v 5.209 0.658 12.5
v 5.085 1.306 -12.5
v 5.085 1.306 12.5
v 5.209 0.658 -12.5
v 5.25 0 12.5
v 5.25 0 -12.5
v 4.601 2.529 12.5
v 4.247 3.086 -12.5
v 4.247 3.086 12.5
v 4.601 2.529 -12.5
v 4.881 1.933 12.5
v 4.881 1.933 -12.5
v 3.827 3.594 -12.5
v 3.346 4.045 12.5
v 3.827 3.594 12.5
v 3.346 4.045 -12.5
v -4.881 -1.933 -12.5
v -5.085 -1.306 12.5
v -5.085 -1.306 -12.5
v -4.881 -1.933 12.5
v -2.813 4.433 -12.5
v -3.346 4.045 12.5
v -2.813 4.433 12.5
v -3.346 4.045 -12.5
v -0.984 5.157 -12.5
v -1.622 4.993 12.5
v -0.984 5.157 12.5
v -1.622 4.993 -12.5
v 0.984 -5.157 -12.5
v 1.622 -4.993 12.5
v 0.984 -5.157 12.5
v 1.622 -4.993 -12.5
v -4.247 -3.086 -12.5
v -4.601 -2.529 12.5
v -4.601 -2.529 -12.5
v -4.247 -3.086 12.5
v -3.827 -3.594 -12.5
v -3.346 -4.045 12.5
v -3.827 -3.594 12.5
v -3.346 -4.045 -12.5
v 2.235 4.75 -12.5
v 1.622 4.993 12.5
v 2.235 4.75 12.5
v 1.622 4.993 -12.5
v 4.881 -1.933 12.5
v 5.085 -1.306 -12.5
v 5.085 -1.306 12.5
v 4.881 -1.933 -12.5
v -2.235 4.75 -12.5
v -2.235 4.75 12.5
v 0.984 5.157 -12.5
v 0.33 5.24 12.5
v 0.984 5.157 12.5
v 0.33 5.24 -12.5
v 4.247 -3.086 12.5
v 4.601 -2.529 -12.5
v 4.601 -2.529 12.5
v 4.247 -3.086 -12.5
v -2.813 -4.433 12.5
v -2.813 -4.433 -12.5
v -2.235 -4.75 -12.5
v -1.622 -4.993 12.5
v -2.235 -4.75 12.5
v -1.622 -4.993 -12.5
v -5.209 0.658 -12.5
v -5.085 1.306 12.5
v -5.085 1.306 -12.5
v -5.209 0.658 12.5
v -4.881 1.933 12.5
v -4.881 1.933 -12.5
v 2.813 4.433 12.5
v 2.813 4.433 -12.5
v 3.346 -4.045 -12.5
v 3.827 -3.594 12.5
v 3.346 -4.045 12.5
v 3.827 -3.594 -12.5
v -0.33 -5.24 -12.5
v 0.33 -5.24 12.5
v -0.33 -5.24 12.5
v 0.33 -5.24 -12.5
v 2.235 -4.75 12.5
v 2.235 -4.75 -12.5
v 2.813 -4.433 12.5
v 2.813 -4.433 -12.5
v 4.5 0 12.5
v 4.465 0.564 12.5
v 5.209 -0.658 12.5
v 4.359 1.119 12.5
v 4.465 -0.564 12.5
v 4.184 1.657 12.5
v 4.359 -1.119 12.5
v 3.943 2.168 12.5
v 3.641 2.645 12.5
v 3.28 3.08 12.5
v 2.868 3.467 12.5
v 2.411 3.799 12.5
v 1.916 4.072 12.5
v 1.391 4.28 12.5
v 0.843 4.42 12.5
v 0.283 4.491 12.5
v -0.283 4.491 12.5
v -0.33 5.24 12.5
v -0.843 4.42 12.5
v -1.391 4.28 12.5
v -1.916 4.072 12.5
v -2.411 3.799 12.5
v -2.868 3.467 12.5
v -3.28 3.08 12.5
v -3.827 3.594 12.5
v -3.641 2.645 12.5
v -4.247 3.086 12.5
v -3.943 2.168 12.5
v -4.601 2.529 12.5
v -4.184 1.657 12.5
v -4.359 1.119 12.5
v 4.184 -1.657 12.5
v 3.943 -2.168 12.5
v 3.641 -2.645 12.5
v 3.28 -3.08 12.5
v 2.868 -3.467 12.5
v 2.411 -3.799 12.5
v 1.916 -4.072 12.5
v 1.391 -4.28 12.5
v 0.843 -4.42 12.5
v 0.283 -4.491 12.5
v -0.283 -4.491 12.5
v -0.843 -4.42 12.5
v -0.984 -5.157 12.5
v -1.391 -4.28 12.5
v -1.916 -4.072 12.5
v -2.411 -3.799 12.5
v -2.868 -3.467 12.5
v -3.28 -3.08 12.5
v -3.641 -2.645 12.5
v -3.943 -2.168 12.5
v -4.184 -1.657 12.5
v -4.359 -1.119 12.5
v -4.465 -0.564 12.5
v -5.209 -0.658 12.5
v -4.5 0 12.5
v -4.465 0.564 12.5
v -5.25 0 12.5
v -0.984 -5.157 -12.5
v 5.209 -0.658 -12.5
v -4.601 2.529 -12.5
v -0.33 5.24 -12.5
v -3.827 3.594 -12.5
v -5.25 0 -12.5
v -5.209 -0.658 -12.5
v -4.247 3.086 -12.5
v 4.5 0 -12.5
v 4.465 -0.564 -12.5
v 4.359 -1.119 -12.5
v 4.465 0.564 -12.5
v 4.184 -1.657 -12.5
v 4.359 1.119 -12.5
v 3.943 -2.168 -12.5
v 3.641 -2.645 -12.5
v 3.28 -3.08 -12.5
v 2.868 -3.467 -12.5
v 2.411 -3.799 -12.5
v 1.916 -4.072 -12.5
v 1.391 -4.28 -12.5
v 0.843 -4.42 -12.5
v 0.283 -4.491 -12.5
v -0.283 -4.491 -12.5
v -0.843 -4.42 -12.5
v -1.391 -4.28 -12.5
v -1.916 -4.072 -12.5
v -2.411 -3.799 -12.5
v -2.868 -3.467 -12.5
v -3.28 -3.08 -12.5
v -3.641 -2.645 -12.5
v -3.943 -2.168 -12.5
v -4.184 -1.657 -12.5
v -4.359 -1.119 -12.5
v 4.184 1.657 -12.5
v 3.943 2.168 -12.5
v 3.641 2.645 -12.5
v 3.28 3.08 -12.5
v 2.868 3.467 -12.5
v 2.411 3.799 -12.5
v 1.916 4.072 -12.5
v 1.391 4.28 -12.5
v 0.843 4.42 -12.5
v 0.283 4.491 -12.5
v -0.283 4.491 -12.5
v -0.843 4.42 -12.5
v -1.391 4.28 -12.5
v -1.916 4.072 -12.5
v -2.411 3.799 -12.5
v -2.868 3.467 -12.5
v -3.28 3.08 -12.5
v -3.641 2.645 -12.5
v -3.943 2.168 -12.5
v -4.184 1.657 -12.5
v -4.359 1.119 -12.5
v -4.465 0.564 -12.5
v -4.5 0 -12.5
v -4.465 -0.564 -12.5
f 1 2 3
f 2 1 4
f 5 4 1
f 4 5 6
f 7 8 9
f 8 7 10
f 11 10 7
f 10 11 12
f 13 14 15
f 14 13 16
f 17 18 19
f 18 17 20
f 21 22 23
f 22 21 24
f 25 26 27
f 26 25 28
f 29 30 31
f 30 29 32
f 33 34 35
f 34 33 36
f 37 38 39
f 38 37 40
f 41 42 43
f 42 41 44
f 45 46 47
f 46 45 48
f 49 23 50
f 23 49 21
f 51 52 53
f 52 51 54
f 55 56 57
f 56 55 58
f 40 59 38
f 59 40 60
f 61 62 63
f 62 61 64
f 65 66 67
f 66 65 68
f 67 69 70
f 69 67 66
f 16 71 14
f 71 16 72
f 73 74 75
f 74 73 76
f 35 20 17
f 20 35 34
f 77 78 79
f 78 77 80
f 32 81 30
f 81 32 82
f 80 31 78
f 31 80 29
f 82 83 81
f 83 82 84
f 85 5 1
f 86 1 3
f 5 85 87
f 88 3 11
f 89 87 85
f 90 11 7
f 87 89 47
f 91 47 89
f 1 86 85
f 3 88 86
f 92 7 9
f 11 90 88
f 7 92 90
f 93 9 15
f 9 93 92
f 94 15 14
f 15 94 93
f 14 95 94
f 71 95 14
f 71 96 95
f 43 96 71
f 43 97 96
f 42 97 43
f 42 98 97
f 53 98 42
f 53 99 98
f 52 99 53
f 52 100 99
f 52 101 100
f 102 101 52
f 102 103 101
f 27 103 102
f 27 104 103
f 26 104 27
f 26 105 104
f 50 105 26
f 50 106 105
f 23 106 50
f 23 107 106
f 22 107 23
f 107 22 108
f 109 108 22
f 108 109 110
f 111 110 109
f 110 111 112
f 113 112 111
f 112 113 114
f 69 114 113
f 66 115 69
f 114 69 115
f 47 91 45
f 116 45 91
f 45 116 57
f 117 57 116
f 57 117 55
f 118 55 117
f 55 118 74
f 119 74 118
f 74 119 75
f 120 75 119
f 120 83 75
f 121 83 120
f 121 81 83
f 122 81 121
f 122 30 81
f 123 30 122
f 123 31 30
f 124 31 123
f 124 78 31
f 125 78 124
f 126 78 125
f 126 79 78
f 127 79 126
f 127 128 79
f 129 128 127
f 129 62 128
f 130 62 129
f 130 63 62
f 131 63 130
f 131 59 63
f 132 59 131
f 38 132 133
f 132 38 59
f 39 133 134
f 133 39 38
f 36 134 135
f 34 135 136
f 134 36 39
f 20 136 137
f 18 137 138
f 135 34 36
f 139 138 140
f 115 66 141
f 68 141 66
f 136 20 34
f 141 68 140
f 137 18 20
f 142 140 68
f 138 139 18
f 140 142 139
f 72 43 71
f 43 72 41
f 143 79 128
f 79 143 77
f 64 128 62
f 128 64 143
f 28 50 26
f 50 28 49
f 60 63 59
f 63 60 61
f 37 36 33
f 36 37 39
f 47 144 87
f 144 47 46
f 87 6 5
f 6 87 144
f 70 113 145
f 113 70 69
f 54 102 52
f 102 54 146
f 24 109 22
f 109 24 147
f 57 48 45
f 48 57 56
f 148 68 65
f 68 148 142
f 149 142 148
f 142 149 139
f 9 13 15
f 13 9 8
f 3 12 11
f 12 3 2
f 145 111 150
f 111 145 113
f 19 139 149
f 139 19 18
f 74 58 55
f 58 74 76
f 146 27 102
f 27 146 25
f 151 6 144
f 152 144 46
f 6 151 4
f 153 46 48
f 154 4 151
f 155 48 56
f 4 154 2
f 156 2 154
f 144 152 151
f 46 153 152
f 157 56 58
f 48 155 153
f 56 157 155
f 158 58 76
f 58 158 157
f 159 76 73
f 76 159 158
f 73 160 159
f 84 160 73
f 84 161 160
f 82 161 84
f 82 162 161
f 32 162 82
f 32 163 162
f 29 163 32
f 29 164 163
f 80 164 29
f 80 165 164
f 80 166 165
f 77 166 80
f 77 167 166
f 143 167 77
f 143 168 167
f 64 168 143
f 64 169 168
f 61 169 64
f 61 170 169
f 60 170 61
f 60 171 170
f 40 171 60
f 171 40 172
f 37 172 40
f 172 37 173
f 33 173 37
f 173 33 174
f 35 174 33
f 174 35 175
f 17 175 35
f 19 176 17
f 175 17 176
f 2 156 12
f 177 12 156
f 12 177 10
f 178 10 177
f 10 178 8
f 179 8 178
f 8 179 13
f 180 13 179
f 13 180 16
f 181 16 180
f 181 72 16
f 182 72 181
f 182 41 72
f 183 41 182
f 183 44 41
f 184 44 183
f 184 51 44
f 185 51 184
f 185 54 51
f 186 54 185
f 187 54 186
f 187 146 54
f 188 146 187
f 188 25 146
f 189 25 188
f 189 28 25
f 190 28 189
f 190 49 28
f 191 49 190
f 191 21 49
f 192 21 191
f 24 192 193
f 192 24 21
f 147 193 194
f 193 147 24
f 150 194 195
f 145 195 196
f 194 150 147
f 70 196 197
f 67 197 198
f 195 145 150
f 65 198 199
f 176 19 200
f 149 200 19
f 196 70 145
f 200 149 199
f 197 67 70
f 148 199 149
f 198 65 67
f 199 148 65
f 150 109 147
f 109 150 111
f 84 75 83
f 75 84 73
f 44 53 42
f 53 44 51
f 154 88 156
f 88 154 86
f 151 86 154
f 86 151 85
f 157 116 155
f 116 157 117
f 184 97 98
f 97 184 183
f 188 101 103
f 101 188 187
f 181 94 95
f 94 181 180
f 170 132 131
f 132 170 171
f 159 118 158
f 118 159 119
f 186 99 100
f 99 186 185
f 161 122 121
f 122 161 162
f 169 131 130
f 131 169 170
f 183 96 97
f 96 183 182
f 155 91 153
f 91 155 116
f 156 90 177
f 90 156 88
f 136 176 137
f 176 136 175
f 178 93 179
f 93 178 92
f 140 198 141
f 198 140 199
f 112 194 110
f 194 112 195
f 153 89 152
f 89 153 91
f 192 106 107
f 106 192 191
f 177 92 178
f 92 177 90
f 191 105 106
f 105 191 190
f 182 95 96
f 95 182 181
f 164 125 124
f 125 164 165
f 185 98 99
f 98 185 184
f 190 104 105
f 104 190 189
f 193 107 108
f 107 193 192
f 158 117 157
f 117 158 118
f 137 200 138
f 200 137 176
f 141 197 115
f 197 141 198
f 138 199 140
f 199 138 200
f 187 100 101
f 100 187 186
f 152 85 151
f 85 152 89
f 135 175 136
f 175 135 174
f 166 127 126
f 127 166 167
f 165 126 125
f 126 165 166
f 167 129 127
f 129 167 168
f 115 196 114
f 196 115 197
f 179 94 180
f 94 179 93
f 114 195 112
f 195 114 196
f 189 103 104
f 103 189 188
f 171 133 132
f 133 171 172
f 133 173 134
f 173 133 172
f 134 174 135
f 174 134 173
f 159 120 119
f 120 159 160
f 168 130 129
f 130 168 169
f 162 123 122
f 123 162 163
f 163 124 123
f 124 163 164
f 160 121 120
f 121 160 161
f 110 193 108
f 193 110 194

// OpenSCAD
$fn = 50;


difference() {
	union() {
		translate(v = [0, 0, -12.5000000000]) {
			cylinder(h = 25, r = 5.2500000000);
		}
	}
	union() {
		translate(v = [0, 0, -100.0000000000]) {
			cylinder(h = 200, r = 4.5000000000);
		}
	}
}
